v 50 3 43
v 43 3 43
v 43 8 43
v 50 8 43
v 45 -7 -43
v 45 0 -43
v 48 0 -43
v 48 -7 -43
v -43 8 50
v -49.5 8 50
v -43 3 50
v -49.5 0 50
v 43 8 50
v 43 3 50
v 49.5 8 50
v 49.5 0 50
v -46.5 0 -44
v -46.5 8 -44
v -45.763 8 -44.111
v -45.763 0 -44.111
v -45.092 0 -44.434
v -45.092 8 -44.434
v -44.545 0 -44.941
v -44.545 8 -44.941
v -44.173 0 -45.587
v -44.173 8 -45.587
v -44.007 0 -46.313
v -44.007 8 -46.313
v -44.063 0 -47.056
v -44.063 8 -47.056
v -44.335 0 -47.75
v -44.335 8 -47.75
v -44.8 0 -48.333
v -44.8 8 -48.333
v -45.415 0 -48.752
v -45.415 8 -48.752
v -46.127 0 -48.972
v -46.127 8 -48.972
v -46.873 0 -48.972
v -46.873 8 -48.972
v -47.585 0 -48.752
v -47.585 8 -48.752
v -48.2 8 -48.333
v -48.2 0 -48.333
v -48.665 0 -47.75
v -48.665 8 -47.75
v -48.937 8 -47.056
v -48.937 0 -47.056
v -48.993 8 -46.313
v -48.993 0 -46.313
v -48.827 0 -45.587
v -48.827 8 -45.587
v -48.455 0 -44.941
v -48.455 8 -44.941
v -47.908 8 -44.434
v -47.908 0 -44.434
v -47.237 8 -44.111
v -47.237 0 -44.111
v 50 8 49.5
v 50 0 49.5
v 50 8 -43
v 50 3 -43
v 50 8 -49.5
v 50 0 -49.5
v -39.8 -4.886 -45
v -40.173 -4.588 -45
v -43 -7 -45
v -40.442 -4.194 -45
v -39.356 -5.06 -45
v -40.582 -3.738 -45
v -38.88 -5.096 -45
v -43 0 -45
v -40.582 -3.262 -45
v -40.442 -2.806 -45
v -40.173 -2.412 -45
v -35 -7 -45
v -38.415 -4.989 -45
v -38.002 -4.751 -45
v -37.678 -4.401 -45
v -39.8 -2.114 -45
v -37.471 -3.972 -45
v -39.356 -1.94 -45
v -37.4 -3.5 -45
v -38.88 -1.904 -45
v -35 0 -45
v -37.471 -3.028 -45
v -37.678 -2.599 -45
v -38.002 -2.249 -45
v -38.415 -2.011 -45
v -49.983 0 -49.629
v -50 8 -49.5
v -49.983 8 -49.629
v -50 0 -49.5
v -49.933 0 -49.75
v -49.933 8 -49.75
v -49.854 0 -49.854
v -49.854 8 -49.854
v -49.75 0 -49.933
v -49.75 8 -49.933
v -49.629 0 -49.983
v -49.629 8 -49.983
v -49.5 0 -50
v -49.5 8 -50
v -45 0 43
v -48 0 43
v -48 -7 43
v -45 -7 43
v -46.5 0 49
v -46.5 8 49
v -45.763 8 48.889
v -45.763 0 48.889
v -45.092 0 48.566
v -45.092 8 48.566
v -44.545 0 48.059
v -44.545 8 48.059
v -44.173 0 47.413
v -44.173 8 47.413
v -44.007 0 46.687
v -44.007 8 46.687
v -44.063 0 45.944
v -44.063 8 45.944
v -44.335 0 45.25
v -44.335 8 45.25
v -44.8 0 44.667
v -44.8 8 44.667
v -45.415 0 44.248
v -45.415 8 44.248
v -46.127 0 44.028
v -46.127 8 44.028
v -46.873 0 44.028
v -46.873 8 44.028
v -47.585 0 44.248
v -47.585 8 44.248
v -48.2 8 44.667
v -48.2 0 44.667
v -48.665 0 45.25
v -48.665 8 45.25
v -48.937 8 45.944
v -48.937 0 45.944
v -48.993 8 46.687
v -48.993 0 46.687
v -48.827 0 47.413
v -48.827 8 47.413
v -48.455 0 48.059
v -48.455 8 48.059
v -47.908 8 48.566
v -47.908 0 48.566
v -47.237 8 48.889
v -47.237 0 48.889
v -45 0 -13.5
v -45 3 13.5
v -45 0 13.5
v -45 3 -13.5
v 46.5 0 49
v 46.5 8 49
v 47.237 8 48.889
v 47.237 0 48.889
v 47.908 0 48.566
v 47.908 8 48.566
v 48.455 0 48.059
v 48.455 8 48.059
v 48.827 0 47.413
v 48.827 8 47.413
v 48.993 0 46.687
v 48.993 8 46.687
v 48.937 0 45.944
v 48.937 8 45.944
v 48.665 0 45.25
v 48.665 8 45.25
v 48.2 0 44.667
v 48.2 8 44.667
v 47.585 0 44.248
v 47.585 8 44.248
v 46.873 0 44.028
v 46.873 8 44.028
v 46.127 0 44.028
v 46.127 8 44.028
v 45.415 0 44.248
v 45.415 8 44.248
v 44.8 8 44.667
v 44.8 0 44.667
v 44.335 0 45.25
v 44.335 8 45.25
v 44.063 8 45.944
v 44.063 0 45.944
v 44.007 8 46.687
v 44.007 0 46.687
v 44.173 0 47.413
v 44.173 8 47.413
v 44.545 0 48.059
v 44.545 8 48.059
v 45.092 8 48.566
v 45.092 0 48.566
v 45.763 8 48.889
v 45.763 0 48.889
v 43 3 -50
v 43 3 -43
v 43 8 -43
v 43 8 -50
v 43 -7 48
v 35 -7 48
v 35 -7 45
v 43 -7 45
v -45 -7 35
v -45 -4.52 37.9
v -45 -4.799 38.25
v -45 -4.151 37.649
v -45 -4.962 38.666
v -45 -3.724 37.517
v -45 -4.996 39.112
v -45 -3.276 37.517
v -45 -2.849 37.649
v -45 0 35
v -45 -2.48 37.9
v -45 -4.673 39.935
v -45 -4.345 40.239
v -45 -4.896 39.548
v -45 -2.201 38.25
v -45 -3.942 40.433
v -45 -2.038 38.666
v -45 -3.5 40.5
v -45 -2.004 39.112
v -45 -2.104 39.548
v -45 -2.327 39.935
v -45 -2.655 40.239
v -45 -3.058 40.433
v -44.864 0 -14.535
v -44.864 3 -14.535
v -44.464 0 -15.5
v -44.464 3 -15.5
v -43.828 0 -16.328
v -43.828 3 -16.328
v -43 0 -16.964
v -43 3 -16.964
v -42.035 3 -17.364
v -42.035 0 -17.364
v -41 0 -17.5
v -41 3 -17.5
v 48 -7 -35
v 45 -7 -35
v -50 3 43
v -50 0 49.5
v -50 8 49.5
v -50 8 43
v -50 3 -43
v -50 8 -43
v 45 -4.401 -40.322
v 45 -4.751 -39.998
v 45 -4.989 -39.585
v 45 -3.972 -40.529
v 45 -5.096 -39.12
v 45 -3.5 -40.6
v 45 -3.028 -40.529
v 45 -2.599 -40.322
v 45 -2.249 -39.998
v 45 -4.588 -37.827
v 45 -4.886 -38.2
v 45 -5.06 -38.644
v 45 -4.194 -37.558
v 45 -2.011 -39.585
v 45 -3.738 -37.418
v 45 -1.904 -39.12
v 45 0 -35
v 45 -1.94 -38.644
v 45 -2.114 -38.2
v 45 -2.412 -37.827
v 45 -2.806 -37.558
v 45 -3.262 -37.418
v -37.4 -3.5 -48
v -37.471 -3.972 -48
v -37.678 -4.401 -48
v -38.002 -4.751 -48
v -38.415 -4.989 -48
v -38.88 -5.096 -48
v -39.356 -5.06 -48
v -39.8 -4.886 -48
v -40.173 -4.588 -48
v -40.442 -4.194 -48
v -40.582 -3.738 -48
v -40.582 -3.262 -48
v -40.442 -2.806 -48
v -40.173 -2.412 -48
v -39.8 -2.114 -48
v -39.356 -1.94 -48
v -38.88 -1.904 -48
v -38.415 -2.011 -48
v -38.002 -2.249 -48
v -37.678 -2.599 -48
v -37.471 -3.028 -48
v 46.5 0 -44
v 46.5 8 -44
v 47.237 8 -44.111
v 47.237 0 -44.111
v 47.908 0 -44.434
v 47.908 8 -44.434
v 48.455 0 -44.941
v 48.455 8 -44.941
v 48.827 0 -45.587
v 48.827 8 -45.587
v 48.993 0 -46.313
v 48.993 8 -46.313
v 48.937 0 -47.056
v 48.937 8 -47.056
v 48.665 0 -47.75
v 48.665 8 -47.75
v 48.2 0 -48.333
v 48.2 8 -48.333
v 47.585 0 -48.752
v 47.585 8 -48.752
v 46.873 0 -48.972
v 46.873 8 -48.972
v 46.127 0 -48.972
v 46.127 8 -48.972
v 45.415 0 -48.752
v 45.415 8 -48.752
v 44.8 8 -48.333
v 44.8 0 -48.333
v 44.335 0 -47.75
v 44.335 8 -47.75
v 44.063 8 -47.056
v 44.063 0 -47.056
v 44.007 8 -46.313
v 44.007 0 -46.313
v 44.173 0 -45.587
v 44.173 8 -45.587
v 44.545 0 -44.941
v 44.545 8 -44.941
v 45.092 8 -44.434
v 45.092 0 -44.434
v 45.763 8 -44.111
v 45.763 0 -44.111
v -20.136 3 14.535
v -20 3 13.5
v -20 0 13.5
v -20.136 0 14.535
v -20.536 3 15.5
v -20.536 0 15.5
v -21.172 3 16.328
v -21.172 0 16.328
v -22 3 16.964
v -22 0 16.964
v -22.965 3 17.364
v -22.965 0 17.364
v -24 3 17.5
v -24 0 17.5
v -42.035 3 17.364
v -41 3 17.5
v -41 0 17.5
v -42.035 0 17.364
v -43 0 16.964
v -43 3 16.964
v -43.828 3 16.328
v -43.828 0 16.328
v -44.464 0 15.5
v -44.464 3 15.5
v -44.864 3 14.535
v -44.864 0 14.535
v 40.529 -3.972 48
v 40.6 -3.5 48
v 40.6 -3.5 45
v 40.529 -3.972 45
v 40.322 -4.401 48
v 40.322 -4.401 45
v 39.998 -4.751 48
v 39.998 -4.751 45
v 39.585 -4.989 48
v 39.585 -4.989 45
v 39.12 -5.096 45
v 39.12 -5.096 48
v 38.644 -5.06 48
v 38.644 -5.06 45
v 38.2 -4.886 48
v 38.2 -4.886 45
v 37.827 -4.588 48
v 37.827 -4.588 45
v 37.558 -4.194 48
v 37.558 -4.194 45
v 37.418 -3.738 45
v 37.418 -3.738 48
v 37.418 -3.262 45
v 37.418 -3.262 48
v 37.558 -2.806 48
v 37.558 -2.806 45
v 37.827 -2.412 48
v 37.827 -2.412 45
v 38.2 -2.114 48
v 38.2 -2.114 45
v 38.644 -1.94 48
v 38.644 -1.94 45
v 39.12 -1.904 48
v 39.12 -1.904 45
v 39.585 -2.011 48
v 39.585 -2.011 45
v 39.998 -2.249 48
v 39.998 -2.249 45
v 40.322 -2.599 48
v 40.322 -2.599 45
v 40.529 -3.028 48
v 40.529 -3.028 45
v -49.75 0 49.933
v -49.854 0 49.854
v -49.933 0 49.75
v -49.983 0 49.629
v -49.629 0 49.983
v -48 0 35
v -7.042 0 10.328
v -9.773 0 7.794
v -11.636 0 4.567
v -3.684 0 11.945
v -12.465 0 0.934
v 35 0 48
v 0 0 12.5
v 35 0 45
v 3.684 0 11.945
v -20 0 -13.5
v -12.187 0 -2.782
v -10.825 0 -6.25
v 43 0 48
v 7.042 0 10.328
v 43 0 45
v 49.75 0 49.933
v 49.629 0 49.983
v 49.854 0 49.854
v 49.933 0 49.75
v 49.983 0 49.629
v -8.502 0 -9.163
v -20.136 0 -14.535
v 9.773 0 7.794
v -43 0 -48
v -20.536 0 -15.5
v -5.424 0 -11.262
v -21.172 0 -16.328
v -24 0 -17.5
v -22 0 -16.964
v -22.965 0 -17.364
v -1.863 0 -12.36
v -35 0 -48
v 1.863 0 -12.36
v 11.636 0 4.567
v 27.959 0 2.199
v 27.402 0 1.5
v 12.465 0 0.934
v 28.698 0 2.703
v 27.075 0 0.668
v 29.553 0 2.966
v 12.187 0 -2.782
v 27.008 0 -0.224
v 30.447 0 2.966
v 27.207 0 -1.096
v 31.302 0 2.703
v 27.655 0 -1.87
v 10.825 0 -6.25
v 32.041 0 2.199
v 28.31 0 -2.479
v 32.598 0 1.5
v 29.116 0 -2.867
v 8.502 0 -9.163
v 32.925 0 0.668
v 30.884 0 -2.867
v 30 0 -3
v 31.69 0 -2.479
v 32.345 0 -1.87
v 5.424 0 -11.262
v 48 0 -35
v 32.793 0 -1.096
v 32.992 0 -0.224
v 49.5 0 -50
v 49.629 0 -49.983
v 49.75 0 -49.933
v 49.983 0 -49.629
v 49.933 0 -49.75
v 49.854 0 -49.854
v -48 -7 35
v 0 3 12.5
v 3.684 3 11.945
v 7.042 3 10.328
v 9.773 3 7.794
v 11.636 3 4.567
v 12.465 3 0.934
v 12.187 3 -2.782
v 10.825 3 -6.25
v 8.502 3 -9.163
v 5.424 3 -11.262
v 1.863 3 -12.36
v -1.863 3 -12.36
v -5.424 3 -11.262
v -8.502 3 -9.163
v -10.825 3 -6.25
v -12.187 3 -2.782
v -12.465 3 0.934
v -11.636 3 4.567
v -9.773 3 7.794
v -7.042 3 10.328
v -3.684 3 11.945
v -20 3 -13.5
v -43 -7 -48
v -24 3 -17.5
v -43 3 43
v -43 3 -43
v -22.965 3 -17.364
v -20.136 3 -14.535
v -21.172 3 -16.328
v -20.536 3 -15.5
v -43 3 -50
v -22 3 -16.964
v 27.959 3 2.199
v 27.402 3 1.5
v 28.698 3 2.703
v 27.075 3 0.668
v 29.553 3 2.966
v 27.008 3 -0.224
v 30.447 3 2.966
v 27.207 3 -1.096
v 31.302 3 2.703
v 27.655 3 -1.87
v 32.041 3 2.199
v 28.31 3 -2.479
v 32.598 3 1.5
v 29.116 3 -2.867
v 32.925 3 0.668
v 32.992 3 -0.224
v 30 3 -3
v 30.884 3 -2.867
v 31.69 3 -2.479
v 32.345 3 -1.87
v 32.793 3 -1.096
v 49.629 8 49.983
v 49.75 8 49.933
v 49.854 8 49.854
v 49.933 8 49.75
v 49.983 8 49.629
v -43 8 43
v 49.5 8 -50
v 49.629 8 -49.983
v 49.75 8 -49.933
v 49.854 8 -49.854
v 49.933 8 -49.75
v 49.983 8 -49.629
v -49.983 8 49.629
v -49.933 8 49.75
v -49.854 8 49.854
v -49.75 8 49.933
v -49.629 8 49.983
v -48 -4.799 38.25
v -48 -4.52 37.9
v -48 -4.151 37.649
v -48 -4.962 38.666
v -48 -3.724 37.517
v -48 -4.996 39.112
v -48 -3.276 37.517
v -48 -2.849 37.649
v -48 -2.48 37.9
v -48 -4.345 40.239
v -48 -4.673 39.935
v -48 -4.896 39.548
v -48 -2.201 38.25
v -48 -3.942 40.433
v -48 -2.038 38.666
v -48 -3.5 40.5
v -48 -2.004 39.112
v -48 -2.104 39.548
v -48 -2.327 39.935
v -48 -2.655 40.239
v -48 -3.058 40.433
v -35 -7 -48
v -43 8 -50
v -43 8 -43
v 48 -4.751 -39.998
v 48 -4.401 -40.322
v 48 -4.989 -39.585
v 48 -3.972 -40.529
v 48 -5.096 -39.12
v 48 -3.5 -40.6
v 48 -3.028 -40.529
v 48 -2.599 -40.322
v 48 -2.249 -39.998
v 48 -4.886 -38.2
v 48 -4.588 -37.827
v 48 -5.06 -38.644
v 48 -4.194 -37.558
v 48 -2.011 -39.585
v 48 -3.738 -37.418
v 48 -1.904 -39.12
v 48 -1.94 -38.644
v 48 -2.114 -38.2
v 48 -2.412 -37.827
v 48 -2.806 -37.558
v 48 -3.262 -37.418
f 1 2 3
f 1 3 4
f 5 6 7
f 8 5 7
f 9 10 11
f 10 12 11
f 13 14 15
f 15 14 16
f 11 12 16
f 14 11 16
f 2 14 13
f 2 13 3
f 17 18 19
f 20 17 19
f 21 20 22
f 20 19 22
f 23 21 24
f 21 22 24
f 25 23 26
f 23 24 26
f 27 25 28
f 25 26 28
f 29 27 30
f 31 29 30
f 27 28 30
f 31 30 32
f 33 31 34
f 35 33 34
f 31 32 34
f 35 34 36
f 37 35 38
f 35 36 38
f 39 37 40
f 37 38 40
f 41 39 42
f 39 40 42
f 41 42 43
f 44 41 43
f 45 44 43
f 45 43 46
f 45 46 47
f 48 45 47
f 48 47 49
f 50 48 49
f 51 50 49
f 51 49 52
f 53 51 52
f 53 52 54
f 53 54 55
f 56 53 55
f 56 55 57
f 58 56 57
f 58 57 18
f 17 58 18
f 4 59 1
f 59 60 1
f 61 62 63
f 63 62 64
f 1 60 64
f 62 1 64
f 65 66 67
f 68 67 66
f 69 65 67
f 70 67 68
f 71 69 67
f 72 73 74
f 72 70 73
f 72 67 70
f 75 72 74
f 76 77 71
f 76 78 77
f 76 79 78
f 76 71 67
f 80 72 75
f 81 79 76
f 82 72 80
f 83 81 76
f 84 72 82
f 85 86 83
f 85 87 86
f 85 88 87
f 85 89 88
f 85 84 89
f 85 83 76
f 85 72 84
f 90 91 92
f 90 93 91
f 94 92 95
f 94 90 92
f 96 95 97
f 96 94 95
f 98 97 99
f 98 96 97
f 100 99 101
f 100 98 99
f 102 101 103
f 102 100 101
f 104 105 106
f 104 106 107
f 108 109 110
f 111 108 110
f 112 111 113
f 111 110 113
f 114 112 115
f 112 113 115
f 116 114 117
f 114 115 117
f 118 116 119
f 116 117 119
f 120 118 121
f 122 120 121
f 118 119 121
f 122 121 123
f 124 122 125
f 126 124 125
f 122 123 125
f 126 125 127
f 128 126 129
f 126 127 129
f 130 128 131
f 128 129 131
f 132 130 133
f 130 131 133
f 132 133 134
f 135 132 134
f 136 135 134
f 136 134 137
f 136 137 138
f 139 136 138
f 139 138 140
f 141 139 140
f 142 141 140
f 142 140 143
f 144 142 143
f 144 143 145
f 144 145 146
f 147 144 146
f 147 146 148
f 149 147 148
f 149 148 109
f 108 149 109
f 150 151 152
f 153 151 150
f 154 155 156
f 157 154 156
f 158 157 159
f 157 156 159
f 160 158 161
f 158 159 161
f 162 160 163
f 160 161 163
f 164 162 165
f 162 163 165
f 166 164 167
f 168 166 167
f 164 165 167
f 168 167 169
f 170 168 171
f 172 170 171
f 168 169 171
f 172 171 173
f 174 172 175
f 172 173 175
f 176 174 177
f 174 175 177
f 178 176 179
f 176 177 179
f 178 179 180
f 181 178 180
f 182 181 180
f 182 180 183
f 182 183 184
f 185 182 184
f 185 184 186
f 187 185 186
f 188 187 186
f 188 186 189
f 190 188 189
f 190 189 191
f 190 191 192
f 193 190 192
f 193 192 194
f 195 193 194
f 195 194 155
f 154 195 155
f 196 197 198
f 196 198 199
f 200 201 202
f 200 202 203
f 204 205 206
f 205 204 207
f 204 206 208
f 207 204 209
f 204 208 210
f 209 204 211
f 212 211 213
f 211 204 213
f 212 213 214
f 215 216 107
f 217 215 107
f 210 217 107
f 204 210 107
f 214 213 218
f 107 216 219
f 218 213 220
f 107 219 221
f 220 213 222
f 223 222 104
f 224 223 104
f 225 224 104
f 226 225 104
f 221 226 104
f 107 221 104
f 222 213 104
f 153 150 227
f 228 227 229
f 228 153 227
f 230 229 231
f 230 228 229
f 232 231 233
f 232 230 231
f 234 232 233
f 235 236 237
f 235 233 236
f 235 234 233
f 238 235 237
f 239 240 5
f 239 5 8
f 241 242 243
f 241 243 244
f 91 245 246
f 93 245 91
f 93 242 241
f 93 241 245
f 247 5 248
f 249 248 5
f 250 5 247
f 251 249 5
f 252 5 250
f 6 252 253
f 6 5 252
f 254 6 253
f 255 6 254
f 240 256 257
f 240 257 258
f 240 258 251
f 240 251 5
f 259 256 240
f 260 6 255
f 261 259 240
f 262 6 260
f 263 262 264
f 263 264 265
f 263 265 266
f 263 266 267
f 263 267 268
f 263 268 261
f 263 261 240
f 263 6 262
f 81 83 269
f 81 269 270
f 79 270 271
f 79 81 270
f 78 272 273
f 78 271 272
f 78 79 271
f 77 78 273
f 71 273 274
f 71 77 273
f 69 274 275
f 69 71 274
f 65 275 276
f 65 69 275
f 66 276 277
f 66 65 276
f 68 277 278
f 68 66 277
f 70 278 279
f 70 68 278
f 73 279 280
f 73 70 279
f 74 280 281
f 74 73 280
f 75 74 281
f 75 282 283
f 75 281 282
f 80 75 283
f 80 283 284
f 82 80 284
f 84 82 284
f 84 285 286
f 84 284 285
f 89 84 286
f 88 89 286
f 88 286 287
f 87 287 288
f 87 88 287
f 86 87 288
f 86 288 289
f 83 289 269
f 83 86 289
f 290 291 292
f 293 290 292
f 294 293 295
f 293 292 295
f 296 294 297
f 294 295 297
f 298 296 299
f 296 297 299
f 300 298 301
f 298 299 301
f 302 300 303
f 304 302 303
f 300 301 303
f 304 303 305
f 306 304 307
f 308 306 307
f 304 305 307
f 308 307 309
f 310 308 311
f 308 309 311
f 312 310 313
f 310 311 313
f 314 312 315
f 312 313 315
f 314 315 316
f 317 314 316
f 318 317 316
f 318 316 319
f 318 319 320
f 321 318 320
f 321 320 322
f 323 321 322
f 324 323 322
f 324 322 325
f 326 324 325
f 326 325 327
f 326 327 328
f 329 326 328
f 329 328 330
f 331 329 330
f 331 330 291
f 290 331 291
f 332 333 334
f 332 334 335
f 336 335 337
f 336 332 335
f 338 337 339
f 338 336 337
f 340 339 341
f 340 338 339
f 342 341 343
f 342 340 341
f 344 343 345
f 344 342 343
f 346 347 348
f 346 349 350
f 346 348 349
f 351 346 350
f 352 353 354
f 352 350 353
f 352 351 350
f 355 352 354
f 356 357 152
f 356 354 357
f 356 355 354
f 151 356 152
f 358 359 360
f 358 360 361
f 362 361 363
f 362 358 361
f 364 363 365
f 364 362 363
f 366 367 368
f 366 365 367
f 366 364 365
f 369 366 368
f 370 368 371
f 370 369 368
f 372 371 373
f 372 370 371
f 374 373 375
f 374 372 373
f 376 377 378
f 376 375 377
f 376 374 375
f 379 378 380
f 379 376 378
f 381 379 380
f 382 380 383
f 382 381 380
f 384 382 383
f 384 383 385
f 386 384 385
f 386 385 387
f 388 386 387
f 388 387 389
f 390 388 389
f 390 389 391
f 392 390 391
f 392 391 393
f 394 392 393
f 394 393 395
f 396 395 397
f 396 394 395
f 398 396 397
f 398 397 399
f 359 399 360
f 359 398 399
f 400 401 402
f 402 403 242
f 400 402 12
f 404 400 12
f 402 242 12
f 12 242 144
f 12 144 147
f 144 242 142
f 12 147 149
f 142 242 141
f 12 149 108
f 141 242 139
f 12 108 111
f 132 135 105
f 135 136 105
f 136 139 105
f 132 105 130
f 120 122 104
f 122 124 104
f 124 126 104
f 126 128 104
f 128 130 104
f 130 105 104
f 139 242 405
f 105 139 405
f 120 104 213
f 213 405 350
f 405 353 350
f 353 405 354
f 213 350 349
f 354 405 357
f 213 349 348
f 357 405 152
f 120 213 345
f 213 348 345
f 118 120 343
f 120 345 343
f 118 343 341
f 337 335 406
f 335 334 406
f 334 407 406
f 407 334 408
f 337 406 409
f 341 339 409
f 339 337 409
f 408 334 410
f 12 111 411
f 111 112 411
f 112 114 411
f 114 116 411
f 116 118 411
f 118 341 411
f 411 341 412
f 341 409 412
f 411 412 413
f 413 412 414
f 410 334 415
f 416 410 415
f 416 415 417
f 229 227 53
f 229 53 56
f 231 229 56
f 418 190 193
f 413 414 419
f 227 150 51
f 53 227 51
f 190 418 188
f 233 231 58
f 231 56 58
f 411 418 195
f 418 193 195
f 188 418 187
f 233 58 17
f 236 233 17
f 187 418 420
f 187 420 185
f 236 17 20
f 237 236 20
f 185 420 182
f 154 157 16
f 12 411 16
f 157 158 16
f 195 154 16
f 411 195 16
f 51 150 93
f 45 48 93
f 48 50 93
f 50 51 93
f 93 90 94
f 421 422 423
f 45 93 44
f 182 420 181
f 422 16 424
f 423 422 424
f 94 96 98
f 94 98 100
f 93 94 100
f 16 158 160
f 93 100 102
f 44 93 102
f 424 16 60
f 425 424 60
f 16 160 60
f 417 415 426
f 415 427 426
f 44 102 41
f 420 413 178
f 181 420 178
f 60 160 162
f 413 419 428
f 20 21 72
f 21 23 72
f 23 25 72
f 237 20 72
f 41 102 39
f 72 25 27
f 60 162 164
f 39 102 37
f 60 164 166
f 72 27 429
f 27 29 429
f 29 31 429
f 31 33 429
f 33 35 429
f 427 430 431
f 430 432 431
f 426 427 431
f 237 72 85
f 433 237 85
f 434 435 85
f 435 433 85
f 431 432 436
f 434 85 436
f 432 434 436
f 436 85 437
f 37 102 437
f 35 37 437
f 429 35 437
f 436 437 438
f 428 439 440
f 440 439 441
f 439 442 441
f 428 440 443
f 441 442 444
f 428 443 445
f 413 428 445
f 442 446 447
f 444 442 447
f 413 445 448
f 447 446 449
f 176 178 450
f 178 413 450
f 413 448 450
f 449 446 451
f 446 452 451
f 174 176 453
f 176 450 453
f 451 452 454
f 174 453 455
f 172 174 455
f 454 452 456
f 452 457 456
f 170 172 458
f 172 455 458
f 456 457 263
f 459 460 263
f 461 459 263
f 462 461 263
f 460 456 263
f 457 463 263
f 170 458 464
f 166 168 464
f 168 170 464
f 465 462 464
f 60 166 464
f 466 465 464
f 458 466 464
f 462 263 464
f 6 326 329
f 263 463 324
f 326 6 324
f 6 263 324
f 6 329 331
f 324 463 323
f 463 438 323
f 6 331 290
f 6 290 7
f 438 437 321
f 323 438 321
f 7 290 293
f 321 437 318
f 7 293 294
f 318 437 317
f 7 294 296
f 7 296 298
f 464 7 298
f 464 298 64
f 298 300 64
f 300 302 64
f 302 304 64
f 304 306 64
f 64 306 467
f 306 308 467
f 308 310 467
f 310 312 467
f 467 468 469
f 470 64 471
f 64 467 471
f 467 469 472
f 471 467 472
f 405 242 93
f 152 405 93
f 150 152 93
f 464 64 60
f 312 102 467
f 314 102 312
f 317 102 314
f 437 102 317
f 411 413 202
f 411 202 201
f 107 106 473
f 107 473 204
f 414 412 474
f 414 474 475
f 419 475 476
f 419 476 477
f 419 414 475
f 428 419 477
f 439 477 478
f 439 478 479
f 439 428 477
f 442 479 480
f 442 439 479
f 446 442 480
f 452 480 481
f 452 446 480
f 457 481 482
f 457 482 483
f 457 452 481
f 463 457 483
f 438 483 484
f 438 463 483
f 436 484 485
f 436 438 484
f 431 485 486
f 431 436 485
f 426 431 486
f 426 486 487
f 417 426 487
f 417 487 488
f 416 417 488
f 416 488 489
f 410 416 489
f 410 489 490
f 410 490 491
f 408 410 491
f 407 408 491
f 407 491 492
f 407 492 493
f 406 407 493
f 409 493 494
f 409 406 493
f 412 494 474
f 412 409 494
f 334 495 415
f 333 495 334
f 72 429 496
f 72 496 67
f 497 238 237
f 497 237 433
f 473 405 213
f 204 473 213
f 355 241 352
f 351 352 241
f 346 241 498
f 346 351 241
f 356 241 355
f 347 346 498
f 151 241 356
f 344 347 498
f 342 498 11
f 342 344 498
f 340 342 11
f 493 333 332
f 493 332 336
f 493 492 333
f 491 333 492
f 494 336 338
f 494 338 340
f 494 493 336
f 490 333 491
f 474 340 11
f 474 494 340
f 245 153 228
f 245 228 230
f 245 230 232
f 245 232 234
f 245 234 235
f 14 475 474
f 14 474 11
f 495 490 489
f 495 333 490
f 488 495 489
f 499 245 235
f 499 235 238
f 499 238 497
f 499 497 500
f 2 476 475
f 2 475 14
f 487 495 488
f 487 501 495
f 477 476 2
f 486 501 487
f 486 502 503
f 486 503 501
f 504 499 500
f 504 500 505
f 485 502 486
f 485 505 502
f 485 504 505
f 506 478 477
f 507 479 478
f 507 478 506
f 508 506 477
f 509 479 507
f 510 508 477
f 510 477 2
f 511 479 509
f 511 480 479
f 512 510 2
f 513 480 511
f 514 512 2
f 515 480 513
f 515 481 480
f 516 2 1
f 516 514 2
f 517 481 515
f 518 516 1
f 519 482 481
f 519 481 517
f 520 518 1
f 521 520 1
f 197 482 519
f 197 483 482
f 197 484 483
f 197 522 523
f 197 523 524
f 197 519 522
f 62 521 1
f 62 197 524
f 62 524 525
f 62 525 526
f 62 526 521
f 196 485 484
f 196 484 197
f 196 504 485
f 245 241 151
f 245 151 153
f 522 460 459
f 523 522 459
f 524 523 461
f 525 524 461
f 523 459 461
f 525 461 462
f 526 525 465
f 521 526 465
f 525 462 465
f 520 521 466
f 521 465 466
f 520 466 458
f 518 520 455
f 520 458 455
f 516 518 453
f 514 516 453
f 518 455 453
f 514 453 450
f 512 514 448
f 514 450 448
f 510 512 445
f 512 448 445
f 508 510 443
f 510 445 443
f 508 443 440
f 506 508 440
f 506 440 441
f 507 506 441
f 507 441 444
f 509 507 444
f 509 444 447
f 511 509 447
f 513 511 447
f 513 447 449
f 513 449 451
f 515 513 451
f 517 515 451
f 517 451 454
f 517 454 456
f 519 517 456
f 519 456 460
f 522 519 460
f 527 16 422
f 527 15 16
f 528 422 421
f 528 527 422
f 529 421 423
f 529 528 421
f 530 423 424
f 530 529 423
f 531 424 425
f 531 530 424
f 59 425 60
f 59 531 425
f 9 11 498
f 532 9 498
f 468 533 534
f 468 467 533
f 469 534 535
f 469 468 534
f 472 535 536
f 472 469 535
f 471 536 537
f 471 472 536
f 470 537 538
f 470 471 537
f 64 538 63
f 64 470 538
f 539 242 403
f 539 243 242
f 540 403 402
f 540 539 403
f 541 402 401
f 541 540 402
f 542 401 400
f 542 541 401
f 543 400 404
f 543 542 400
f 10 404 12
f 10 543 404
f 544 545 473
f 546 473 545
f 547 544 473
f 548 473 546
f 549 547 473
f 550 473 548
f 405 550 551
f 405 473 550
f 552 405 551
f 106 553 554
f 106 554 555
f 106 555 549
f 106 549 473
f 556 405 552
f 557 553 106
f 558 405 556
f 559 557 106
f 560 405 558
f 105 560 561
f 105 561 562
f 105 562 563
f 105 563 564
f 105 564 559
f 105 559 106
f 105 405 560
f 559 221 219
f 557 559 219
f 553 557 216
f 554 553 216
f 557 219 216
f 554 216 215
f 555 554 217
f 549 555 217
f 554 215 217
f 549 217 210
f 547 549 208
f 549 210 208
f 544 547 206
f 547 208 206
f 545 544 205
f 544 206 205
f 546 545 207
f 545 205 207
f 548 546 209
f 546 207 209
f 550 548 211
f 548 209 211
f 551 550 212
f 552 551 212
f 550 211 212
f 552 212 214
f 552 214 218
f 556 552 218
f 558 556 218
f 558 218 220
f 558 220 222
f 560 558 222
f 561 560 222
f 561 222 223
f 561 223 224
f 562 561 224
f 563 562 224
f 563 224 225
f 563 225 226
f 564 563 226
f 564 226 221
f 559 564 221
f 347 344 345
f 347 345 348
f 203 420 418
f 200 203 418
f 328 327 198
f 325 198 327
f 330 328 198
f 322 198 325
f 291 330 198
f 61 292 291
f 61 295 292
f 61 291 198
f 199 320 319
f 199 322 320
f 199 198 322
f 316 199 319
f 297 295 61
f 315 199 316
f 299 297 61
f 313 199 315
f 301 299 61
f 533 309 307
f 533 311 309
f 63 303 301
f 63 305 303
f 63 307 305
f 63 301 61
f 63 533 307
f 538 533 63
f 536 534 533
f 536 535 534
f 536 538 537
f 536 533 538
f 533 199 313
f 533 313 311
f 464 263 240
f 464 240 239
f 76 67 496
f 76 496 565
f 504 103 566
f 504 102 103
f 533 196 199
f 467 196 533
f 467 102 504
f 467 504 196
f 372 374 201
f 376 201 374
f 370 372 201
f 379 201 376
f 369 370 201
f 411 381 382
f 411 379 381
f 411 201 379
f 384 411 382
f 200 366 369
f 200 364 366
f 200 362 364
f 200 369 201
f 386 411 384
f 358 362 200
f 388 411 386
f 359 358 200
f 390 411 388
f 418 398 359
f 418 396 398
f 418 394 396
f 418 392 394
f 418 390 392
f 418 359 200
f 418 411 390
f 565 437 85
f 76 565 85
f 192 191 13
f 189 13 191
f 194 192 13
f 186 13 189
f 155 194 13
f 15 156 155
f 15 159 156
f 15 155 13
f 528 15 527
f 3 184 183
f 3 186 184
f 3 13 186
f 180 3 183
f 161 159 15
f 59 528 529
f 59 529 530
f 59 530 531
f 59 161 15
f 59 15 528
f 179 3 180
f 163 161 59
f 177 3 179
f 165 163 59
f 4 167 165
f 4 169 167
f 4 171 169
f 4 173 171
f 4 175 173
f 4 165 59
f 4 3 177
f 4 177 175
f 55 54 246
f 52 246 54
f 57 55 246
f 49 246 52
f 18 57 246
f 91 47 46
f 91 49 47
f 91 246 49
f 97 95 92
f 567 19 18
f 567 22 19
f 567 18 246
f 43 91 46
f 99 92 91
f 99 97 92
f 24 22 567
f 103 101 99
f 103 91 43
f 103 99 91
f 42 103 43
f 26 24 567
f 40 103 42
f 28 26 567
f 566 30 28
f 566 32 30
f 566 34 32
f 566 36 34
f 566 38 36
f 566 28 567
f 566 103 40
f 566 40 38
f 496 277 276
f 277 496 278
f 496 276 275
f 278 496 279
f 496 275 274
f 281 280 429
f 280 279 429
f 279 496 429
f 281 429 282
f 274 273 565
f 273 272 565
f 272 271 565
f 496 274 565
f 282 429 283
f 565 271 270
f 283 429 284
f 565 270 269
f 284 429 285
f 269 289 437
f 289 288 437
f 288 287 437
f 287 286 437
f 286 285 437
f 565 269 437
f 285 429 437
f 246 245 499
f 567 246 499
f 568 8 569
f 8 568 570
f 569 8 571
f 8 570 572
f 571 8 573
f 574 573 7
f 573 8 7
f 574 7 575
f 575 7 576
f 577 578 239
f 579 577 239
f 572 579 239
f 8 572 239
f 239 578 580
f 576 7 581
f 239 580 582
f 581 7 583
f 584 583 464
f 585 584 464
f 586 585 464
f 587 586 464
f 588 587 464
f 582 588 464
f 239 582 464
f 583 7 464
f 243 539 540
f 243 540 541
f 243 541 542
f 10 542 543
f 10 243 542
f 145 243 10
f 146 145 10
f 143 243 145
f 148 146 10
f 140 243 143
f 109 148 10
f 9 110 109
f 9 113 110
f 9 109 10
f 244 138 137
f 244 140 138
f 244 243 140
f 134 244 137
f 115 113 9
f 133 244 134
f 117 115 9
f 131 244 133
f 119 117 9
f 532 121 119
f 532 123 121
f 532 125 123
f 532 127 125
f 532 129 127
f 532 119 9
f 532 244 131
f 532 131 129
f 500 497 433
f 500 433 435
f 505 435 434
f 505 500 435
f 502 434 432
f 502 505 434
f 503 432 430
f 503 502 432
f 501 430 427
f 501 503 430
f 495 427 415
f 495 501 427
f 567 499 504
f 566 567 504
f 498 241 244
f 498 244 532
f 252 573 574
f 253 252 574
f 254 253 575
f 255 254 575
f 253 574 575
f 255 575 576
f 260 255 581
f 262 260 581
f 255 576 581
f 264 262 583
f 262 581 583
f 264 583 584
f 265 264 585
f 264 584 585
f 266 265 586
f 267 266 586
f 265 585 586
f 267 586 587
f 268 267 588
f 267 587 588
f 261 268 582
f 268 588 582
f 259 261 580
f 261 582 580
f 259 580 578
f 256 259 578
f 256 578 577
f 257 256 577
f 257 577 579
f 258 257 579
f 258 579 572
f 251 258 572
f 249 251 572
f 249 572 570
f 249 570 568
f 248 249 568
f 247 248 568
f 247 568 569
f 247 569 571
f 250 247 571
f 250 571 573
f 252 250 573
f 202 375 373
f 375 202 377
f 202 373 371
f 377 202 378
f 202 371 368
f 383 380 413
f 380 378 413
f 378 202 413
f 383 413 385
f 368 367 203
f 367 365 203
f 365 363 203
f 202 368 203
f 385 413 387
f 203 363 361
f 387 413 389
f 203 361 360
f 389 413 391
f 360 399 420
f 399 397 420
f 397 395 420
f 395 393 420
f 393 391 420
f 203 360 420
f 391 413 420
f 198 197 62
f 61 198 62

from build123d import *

# Parameters (mm, degrees)
SKETCH2_W           = 100
SKETCH2_H           = 100
SKETCH2_R           = 12.5
BOSS_EXTRUDE1_DEPTH = 3
SKETCH3_W           = 7
SKETCH3_H           = 7
BOSS_EXTRUDE2_DEPTH = 5
SKETCH4_W           = 3
SKETCH4_H           = 8
SKETCH4_W_2         = 8
SKETCH4_H_2         = 3
BOSS_EXTRUDE3_DEPTH = 7
SKETCH11_R          = 2.5
CUT_EXTRUDE6_DEPTH  = 73.284161474
SKETCH5_R           = 1.6
CUT_EXTRUDE1_DEPTH  = 113.089250154
SKETCH7_R           = 3
CUT_EXTRUDE3_DEPTH  = 10
SKETCH8_R           = 1.6
SKETCH8_R_2         = 1.5
CUT_EXTRUDE4_DEPTH  = 111.308657865
FILLET1_R           = 0.5
CUT_EXTRUDE5_DEPTH  = 10


with BuildPart() as part:
    # Sketch2 → Boss-Extrude1 (new body)
    with BuildSketch(Plane(origin=(0, 0, 0), x_dir=(1, 0, 0), z_dir=(0, 1, 0))):
        Rectangle(SKETCH2_W, SKETCH2_H)
        with Locations(Location((0, 0, 0), (0, 0, 270))):
            Circle(SKETCH2_R, mode=Mode.SUBTRACT)
    extrude(amount=BOSS_EXTRUDE1_DEPTH)

    # Sketch3 → Boss-Extrude2 (add)
    with BuildSketch(Plane(origin=(0, 3, 0), x_dir=(1, 0, 0), z_dir=(0, 1, 0))):
        with Locations((-46.5, 46.5)):
            Rectangle(SKETCH3_W, SKETCH3_H)
        with Locations((46.5, 46.5)):
            Rectangle(SKETCH3_W, SKETCH3_H)
        with Locations((46.5, -46.5)):
            Rectangle(SKETCH3_W, SKETCH3_H)
        with Locations((-46.5, -46.5)):
            Rectangle(SKETCH3_W, SKETCH3_H)
    extrude(amount=BOSS_EXTRUDE2_DEPTH)

    # Sketch4 → Boss-Extrude3 (add)
    with BuildSketch(Plane.XZ):
        with Locations((46.5, -39)):
            Rectangle(SKETCH4_W, SKETCH4_H)
        with Locations((39, 46.5)):
            Rectangle(SKETCH4_W_2, SKETCH4_H_2)
        with Locations((-46.5, 39)):
            Rectangle(SKETCH4_W, SKETCH4_H)
        with Locations((-39, -46.5)):
            Rectangle(SKETCH4_W_2, SKETCH4_H_2)
    extrude(amount=BOSS_EXTRUDE3_DEPTH)

    # Sketch11 → Cut-Extrude6 (cut, through all)
    with BuildSketch(Plane(origin=(0, 8, 0), x_dir=(1, 0, 0), z_dir=(0, 1, 0))):
        with Locations(Location((-46.5, 46.5, 0), (0, 0, 270))):
            Circle(SKETCH11_R)
        with Locations(Location((46.5, 46.5, 0), (0, 0, 270))):
            Circle(SKETCH11_R)
        with Locations(Location((46.5, -46.5, 0), (0, 0, 270))):
            Circle(SKETCH11_R)
        with Locations(Location((-46.5, -46.5, 0), (0, 0, 270))):
            Circle(SKETCH11_R)
    extrude(amount=-CUT_EXTRUDE6_DEPTH, mode=Mode.SUBTRACT)

    # Sketch5 → Cut-Extrude1 (cut, through all)
    with BuildSketch(Plane(origin=(0, 0, 50), x_dir=(-1, 0, 0), z_dir=(0, 0, -1))):
        with Locations(Location((-39, -3.5, 0), (0, 0, 180))):
            Circle(SKETCH5_R)
        with Locations(Location((39, -3.5, 0), (0, 0, 180))):
            Circle(SKETCH5_R)
    extrude(amount=CUT_EXTRUDE1_DEPTH, mode=Mode.SUBTRACT)

    # Sketch7 → Cut-Extrude3 (cut)
    with BuildSketch(Plane.XZ):
        with Locations(Location((30, 0, 0), (0, 0, 270))):
            Circle(SKETCH7_R)
    extrude(amount=-CUT_EXTRUDE3_DEPTH, mode=Mode.SUBTRACT)

    # Sketch8 → Cut-Extrude4 (cut, through all)
    with BuildSketch(Plane(origin=(48, 0, 0), x_dir=(0, 0, -1), z_dir=(1, 0, 0))):
        with Locations((39, -3.5)):
            Circle(SKETCH8_R)
        with Locations(Location((-39, -3.5, 0), (0, 0, 180))):
            Circle(SKETCH8_R_2)
    extrude(amount=-CUT_EXTRUDE4_DEPTH, mode=Mode.SUBTRACT)

    # Fillet1
    fillet1_edges = [part.edges().sort_by_distance(p)[0] for p in [
        (-50, 4, 50),
        (-50, 4, -50),
        (50, 4, -50),
        (50, 4, 50),
    ]]
    fillet(fillet1_edges, radius=FILLET1_R)

    # Sketch9 → Cut-Extrude5 (cut)
    with BuildSketch(Plane(origin=(0, 3, 0), x_dir=(1, 0, 0), z_dir=(0, 1, 0))):
        with BuildLine():
            Line((-41, 17.5), (-24, 17.5))
            ThreePointArc((-24, 17.5), (-21.171572875, 16.328427125), (-20, 13.5))
            Line((-20, 13.5), (-20, -13.5))
            ThreePointArc((-20, -13.5), (-21.171572875, -16.328427125), (-24, -17.5))
            Line((-24, -17.5), (-41, -17.5))
            ThreePointArc((-41, -17.5), (-43.828427125, -16.328427125), (-45, -13.5))
            Line((-45, -13.5), (-45, 13.5))
            ThreePointArc((-45, 13.5), (-43.828427125, 16.328427125), (-41, 17.5))
        make_face()
    extrude(amount=-CUT_EXTRUDE5_DEPTH, mode=Mode.SUBTRACT)


solid = part.part
